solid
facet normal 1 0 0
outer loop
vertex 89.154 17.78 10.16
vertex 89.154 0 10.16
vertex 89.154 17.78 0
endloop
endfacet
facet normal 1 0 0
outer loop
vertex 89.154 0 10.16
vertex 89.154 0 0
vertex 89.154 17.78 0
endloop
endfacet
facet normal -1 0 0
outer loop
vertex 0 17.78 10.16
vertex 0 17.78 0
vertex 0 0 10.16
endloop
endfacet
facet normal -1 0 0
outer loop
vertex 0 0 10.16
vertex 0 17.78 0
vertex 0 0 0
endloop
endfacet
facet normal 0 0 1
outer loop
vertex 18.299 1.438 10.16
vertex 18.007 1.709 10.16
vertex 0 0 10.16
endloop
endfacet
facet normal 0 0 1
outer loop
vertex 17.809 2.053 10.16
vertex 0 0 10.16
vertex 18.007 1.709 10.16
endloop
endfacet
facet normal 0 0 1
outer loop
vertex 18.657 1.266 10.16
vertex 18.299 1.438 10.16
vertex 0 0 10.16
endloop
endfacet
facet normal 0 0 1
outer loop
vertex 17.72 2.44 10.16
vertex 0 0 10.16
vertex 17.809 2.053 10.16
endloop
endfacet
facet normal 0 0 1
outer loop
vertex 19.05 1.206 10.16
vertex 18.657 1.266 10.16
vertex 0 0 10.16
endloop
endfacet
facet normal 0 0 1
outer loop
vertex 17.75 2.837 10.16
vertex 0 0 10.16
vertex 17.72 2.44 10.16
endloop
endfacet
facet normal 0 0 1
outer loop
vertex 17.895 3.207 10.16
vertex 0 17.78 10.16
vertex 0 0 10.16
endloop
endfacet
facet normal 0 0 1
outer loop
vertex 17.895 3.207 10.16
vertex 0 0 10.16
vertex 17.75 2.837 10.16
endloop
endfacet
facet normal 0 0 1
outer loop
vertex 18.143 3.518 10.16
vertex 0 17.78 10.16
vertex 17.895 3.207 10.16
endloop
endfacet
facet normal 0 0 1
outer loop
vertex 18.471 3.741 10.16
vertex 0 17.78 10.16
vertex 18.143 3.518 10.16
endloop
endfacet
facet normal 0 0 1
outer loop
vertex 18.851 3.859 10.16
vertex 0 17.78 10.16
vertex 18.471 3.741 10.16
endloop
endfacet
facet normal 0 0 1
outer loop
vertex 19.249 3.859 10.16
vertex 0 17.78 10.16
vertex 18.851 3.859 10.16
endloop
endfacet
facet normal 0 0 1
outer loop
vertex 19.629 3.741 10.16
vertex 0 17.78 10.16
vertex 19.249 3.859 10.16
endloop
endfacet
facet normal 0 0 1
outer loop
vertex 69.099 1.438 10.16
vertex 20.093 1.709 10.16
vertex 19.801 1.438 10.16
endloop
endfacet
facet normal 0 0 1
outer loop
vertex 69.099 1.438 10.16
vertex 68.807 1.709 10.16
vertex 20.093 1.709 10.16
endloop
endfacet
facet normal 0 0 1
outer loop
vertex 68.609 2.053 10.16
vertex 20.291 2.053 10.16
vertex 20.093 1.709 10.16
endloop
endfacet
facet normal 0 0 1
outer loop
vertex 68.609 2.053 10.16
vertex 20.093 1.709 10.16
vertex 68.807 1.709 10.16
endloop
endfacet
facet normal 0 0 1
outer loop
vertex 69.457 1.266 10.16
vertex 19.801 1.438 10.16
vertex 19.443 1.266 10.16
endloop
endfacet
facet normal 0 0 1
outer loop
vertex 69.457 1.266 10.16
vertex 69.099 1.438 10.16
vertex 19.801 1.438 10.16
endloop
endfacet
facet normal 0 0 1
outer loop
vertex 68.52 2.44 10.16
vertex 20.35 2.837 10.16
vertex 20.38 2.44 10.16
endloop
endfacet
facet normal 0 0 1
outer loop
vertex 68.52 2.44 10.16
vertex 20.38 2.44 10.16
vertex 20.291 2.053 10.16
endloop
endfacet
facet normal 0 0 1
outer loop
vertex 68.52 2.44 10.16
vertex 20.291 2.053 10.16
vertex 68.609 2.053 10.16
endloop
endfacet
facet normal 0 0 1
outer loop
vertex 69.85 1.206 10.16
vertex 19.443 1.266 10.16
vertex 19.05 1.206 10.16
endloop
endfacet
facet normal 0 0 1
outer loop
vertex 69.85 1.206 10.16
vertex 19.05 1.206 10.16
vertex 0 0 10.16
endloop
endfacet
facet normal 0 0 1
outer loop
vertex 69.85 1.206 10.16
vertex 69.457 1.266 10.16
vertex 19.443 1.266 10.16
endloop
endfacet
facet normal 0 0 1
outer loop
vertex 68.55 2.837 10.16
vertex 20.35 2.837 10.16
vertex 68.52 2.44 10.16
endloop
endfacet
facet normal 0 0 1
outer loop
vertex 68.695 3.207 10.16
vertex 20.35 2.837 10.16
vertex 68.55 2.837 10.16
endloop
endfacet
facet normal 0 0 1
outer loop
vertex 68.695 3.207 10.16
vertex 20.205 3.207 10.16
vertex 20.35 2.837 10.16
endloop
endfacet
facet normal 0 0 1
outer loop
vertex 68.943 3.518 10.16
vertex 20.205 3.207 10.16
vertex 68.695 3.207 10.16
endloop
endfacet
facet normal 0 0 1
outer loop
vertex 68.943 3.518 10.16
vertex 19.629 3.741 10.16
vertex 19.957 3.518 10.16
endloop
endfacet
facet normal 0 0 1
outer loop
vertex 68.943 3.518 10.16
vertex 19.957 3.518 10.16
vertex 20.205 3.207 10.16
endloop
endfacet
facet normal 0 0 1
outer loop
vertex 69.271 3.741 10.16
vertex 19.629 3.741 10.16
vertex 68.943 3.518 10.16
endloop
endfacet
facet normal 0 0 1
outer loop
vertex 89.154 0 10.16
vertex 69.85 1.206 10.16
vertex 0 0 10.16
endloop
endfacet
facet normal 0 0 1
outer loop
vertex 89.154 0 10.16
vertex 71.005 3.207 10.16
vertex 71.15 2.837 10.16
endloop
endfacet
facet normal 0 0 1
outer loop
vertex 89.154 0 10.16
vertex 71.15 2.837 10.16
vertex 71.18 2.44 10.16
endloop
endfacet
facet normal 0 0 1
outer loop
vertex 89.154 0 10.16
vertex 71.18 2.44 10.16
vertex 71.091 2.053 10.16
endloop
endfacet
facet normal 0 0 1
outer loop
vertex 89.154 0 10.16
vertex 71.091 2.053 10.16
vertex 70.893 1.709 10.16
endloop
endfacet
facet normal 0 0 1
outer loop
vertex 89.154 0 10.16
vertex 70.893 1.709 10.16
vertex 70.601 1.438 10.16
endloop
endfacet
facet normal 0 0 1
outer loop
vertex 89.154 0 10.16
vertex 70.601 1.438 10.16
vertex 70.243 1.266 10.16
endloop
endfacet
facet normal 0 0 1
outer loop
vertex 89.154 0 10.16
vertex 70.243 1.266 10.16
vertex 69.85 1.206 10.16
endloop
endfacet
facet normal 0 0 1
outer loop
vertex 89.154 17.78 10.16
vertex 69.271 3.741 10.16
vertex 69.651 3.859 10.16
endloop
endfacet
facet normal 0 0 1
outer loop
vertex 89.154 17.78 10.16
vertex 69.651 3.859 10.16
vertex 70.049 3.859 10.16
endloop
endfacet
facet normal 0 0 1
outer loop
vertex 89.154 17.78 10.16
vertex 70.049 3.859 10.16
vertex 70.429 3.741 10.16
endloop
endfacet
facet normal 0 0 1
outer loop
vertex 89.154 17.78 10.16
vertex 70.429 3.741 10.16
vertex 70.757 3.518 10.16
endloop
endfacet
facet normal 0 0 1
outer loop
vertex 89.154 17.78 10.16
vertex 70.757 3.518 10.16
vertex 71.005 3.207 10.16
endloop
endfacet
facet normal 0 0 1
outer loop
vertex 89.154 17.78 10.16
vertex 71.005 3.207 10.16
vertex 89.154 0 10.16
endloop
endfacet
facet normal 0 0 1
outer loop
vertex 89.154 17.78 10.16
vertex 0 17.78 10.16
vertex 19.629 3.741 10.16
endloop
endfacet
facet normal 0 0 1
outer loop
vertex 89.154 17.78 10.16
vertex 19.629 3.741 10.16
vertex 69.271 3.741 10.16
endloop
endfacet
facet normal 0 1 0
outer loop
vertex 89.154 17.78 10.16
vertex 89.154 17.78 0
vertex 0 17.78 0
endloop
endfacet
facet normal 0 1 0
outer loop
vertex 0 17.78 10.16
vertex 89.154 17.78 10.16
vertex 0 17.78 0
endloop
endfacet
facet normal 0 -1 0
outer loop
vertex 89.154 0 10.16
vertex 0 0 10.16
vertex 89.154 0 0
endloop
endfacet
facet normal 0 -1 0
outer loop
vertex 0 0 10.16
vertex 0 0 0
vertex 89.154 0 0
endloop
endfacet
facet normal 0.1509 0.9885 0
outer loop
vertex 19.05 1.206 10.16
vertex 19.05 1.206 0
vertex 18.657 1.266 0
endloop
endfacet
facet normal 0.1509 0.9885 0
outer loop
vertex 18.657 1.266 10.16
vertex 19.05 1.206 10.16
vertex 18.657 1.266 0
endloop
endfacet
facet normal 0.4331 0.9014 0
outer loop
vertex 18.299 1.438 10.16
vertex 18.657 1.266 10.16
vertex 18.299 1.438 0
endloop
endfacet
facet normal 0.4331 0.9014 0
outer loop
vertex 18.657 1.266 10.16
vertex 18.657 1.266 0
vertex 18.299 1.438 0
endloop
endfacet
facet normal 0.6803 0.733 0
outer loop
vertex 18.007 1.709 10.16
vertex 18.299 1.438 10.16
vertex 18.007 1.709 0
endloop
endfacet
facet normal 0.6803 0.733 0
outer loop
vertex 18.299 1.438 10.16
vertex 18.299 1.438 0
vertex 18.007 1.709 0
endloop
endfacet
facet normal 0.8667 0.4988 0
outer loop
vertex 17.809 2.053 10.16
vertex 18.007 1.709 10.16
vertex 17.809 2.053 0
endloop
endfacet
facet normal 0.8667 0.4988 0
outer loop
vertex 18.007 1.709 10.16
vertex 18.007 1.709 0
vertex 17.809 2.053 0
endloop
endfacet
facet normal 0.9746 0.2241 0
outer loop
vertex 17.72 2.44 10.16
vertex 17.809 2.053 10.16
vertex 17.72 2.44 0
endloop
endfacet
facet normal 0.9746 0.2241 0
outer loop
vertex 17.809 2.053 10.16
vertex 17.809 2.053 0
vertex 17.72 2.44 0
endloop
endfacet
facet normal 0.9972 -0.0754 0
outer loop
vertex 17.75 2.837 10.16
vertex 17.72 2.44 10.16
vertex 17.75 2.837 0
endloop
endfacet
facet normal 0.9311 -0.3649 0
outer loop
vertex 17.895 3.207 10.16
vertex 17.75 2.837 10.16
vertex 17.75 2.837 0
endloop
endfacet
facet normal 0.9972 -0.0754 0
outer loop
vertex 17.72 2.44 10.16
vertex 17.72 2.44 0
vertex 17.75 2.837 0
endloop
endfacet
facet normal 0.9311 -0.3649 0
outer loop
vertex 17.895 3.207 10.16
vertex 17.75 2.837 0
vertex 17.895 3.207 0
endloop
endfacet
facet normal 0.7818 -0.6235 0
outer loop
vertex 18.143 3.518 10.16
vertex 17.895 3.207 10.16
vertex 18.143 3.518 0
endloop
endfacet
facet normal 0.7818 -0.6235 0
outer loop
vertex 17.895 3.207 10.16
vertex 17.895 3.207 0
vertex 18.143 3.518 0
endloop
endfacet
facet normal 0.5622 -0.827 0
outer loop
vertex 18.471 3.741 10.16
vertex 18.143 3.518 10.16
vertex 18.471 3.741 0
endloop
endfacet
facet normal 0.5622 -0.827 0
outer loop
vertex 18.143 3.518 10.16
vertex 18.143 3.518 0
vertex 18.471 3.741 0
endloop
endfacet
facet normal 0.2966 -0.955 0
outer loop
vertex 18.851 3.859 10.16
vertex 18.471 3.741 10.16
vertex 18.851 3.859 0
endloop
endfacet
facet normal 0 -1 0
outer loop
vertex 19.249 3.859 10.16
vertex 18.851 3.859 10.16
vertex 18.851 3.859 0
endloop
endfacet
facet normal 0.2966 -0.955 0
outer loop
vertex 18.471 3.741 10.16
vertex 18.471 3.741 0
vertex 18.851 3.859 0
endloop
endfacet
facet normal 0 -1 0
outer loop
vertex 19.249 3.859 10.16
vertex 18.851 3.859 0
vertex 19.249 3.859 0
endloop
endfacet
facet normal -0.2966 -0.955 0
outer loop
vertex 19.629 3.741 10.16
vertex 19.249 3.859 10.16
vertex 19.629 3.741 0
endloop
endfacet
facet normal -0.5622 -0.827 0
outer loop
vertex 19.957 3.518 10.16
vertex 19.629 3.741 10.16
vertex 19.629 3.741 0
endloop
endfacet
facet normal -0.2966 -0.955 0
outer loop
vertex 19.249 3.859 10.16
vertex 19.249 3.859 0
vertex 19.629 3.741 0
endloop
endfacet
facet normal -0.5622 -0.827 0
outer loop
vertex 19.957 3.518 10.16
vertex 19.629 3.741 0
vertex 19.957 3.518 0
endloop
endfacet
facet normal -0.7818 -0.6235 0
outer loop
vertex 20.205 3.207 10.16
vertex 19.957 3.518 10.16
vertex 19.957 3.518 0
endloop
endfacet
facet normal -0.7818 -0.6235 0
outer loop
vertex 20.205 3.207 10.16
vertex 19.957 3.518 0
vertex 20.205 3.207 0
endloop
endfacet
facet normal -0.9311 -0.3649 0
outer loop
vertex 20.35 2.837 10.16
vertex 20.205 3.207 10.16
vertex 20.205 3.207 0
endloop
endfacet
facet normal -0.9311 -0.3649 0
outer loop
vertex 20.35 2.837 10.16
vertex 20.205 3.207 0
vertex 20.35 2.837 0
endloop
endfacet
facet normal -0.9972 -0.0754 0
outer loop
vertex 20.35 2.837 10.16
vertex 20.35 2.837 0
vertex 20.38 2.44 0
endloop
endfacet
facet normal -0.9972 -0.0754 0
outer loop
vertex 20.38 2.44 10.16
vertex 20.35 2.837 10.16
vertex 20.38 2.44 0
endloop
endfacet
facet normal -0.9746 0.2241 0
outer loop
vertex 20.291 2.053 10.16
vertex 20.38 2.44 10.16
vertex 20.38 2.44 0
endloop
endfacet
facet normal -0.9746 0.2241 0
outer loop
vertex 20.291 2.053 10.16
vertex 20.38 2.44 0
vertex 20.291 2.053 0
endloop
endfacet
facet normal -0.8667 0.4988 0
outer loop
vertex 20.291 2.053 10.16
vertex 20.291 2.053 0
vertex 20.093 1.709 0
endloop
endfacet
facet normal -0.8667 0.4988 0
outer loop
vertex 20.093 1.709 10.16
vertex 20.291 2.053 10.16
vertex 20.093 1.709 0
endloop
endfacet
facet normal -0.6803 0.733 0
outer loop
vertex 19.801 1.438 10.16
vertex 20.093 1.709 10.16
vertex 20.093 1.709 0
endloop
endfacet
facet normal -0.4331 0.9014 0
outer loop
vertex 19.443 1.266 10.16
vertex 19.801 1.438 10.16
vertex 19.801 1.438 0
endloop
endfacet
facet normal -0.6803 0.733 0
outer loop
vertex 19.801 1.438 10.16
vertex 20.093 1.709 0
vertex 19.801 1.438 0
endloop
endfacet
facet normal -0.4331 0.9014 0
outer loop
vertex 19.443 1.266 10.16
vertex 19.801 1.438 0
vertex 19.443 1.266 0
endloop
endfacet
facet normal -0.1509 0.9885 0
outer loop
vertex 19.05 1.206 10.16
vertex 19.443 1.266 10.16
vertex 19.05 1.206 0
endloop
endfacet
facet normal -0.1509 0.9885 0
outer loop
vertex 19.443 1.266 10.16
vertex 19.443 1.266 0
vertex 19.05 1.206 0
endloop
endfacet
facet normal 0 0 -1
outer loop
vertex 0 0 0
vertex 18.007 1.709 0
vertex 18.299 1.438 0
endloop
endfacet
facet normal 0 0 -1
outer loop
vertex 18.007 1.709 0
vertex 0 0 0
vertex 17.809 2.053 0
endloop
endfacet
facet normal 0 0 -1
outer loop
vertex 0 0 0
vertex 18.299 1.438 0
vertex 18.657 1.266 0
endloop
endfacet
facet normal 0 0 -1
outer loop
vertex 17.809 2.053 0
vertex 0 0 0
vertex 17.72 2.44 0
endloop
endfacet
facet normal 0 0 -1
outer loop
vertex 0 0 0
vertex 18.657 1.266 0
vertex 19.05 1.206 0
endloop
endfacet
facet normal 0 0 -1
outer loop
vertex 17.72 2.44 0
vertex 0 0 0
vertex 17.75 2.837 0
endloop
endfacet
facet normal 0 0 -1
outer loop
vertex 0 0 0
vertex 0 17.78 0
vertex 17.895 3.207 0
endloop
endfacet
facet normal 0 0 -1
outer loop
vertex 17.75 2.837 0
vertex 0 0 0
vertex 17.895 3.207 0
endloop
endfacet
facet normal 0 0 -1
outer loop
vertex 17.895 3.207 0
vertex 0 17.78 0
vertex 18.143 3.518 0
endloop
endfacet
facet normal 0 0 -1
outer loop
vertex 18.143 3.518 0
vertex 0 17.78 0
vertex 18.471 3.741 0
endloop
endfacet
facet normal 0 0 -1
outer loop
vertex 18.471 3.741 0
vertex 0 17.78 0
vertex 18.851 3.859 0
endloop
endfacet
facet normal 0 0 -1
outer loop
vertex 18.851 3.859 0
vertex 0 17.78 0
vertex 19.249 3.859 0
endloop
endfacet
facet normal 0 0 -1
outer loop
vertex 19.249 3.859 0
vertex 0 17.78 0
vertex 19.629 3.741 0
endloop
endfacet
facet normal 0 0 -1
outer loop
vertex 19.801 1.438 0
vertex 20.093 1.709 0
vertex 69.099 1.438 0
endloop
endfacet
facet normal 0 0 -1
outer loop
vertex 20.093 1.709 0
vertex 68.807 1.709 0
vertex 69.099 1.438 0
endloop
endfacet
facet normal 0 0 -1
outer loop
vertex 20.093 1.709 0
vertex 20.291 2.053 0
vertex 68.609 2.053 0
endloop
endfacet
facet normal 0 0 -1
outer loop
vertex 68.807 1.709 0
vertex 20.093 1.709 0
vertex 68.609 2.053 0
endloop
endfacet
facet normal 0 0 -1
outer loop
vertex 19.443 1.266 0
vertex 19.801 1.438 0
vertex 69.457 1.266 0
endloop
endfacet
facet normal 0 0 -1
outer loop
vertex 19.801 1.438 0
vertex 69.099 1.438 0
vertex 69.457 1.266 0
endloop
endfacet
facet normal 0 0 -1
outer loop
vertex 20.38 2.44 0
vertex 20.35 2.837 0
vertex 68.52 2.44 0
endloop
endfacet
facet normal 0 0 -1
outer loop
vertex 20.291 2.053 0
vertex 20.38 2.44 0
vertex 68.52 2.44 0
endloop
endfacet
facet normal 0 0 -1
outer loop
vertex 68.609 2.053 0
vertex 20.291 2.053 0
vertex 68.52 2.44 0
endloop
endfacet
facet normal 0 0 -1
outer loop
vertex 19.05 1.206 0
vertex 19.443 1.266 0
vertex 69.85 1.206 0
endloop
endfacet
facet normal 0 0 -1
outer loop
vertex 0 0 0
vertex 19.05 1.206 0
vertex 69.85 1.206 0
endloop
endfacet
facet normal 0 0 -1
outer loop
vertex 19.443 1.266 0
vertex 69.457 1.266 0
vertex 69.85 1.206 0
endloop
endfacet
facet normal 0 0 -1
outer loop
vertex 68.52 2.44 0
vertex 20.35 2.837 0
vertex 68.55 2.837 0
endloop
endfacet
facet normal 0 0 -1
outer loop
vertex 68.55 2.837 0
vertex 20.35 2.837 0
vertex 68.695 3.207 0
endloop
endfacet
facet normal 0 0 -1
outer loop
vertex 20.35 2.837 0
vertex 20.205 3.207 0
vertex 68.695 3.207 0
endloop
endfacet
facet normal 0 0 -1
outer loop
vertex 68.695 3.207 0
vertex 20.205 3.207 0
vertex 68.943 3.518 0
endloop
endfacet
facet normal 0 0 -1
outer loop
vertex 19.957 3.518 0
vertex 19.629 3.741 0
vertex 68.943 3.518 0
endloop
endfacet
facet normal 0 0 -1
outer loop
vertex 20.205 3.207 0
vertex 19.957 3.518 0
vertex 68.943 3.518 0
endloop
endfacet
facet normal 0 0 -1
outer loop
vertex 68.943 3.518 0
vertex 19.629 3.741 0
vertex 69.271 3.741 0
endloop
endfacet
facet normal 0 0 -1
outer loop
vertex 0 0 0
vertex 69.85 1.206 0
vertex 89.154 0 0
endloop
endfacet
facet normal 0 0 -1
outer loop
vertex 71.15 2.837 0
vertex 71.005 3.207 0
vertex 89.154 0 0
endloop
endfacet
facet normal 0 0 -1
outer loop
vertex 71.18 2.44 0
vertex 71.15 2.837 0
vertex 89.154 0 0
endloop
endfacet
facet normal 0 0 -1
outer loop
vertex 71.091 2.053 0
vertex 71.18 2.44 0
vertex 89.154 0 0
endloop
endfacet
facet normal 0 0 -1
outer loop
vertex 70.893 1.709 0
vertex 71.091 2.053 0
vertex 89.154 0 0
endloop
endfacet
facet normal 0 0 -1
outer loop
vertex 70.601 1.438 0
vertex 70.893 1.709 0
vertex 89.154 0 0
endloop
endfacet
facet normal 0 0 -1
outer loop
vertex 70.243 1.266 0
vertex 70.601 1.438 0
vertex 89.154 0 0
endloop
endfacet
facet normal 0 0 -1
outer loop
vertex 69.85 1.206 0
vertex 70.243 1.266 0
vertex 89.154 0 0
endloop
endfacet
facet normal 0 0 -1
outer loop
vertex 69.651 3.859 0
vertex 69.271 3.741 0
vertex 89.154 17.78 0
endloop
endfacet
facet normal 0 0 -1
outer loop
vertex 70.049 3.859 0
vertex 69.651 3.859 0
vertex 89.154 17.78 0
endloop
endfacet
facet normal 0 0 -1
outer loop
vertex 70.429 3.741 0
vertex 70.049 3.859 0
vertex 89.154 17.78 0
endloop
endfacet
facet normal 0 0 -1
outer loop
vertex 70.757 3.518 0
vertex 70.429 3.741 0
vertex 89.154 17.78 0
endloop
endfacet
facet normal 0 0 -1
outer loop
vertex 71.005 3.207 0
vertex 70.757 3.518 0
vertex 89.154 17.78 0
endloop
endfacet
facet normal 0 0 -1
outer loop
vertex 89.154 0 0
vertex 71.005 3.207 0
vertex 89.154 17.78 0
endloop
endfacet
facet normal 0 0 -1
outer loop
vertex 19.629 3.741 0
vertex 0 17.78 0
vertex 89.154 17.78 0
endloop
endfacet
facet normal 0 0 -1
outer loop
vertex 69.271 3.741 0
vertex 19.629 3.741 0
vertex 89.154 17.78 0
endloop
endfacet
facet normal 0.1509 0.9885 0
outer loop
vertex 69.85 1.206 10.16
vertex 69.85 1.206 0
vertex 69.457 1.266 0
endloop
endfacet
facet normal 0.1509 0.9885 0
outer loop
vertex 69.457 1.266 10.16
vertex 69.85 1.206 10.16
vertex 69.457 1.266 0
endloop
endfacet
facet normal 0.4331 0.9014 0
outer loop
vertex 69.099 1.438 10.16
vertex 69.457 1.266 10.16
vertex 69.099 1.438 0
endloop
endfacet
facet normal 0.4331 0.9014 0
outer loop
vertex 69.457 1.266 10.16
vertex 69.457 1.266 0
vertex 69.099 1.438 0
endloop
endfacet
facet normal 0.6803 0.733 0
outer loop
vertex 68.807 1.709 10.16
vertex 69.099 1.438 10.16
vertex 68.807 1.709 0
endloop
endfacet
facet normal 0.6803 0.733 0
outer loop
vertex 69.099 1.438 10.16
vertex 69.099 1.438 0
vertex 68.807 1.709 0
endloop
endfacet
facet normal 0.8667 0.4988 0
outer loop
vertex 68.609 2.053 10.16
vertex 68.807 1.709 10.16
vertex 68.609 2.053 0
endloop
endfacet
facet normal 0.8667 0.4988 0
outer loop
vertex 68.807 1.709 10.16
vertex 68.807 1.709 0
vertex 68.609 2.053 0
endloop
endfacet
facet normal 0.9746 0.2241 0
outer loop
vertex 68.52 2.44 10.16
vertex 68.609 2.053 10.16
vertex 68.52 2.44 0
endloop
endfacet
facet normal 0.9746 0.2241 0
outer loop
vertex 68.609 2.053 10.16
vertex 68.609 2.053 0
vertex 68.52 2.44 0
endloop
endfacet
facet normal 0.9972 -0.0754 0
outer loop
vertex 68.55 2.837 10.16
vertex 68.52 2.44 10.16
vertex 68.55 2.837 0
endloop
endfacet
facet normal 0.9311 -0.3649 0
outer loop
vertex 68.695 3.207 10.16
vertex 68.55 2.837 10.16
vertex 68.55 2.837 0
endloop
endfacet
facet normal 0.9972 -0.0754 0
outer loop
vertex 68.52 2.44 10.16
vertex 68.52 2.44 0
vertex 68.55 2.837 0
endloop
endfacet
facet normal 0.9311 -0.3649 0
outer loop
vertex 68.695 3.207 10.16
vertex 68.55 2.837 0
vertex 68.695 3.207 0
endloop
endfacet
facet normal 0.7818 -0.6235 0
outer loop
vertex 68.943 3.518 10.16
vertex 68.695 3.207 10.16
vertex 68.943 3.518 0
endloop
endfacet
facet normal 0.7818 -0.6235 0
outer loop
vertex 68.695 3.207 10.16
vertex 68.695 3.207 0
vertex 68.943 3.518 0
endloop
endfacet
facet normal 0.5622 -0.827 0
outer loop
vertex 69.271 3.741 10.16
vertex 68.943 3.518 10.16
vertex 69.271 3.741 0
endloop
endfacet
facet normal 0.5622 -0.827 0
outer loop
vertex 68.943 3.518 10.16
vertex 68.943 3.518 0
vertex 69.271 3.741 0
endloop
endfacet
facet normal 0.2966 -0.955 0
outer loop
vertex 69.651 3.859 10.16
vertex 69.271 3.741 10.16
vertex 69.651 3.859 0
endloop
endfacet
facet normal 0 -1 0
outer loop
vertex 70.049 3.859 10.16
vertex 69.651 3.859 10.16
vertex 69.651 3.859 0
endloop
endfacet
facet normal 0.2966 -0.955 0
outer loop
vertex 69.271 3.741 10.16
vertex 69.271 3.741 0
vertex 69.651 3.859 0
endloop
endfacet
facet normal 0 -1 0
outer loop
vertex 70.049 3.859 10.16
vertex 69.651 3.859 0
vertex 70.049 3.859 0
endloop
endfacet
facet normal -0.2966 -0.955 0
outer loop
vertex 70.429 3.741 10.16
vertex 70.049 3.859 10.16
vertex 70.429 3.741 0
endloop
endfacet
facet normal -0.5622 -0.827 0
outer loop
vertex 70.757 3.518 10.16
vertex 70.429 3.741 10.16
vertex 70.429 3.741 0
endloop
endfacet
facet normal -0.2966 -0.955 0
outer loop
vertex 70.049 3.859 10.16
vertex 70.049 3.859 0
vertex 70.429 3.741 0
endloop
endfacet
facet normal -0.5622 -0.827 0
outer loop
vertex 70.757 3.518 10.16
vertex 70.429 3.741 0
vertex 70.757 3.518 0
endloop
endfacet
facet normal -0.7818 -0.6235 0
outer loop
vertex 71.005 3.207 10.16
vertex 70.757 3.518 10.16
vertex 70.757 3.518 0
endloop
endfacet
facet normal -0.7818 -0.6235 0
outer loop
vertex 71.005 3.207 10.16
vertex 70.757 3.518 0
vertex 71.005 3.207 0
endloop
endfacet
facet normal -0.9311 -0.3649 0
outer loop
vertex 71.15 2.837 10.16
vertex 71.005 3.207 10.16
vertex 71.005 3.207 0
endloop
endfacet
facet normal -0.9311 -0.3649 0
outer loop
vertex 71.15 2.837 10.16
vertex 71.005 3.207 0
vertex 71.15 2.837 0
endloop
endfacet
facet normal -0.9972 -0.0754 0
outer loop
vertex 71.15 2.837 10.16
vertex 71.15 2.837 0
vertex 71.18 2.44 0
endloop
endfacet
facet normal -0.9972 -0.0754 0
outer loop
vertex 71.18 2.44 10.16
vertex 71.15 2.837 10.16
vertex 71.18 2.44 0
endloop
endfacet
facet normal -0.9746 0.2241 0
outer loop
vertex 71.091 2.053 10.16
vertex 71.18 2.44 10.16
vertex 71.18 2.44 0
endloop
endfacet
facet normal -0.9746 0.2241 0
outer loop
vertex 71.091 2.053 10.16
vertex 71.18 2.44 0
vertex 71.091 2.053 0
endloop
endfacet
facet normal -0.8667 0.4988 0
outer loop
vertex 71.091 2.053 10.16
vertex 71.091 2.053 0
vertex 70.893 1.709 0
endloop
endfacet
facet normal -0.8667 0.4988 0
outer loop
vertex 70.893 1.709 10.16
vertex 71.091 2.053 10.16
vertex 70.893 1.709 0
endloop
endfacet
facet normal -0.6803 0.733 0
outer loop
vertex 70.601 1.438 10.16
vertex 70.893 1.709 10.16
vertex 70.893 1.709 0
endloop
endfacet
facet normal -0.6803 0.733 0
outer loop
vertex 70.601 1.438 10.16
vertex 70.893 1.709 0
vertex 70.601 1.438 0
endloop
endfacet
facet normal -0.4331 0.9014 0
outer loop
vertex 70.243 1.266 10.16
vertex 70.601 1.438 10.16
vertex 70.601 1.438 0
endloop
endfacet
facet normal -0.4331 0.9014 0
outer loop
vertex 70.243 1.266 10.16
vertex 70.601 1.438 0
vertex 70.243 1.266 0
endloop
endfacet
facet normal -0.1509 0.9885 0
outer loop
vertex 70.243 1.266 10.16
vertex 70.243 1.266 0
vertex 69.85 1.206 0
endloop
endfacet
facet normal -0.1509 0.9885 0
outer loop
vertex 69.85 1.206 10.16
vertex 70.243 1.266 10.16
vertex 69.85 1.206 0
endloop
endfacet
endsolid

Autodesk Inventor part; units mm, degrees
ref_plane "YZ Plane" through (0, 0, 0) normal (1, 0, 0) x (0, 1, 0)
ref_plane "XZ Plane" through (0, 0, 0) normal (0, 1, 0) x (-1, 0, 0)
ref_plane "XY Plane" through (0, 0, 0) normal (0, 0, 1) x (1, 0, 0)
sketch "Sketch1" plane through (0, 0, 0) normal (0, 0, 1) x (1, 0, 0)
  line L0 (0, 0) -> (89.154, 0)
  line L1 (89.154, 0) -> (89.154, 17.78)
  line L2 (89.154, 17.78) -> (0, 17.78)
  line L3 (0, 17.78) -> (0, 0)
  dimension "d0" = 89.154
  dimension "d1" = 17.78
extrude "Extrusion1" add sketch "Sketch1" along normal blind 10.16
sketch "Sketch2" plane through (0, 0, 10.16) normal (0, 0, 1) x (1, 0, 0)
  line L0 (0, 17.78) -> (0, 0) projected
  line L1 (0, 0) -> (89.154, 0) projected
  point P0 (19.05, 2.54)
  point P1 (69.85, 2.54)
  point P2 (0, 8.89)
  dimension "d4" = 19.05
  dimension "d5" = 50.8
  dimension "d6" = 2.54
hole "Hole1" at (19.05, 2.54, 10.16) at (69.85, 2.54, 10.16) direction (0, 0, -1) diameter 2.667 end through all
properties part number "Coupler"
